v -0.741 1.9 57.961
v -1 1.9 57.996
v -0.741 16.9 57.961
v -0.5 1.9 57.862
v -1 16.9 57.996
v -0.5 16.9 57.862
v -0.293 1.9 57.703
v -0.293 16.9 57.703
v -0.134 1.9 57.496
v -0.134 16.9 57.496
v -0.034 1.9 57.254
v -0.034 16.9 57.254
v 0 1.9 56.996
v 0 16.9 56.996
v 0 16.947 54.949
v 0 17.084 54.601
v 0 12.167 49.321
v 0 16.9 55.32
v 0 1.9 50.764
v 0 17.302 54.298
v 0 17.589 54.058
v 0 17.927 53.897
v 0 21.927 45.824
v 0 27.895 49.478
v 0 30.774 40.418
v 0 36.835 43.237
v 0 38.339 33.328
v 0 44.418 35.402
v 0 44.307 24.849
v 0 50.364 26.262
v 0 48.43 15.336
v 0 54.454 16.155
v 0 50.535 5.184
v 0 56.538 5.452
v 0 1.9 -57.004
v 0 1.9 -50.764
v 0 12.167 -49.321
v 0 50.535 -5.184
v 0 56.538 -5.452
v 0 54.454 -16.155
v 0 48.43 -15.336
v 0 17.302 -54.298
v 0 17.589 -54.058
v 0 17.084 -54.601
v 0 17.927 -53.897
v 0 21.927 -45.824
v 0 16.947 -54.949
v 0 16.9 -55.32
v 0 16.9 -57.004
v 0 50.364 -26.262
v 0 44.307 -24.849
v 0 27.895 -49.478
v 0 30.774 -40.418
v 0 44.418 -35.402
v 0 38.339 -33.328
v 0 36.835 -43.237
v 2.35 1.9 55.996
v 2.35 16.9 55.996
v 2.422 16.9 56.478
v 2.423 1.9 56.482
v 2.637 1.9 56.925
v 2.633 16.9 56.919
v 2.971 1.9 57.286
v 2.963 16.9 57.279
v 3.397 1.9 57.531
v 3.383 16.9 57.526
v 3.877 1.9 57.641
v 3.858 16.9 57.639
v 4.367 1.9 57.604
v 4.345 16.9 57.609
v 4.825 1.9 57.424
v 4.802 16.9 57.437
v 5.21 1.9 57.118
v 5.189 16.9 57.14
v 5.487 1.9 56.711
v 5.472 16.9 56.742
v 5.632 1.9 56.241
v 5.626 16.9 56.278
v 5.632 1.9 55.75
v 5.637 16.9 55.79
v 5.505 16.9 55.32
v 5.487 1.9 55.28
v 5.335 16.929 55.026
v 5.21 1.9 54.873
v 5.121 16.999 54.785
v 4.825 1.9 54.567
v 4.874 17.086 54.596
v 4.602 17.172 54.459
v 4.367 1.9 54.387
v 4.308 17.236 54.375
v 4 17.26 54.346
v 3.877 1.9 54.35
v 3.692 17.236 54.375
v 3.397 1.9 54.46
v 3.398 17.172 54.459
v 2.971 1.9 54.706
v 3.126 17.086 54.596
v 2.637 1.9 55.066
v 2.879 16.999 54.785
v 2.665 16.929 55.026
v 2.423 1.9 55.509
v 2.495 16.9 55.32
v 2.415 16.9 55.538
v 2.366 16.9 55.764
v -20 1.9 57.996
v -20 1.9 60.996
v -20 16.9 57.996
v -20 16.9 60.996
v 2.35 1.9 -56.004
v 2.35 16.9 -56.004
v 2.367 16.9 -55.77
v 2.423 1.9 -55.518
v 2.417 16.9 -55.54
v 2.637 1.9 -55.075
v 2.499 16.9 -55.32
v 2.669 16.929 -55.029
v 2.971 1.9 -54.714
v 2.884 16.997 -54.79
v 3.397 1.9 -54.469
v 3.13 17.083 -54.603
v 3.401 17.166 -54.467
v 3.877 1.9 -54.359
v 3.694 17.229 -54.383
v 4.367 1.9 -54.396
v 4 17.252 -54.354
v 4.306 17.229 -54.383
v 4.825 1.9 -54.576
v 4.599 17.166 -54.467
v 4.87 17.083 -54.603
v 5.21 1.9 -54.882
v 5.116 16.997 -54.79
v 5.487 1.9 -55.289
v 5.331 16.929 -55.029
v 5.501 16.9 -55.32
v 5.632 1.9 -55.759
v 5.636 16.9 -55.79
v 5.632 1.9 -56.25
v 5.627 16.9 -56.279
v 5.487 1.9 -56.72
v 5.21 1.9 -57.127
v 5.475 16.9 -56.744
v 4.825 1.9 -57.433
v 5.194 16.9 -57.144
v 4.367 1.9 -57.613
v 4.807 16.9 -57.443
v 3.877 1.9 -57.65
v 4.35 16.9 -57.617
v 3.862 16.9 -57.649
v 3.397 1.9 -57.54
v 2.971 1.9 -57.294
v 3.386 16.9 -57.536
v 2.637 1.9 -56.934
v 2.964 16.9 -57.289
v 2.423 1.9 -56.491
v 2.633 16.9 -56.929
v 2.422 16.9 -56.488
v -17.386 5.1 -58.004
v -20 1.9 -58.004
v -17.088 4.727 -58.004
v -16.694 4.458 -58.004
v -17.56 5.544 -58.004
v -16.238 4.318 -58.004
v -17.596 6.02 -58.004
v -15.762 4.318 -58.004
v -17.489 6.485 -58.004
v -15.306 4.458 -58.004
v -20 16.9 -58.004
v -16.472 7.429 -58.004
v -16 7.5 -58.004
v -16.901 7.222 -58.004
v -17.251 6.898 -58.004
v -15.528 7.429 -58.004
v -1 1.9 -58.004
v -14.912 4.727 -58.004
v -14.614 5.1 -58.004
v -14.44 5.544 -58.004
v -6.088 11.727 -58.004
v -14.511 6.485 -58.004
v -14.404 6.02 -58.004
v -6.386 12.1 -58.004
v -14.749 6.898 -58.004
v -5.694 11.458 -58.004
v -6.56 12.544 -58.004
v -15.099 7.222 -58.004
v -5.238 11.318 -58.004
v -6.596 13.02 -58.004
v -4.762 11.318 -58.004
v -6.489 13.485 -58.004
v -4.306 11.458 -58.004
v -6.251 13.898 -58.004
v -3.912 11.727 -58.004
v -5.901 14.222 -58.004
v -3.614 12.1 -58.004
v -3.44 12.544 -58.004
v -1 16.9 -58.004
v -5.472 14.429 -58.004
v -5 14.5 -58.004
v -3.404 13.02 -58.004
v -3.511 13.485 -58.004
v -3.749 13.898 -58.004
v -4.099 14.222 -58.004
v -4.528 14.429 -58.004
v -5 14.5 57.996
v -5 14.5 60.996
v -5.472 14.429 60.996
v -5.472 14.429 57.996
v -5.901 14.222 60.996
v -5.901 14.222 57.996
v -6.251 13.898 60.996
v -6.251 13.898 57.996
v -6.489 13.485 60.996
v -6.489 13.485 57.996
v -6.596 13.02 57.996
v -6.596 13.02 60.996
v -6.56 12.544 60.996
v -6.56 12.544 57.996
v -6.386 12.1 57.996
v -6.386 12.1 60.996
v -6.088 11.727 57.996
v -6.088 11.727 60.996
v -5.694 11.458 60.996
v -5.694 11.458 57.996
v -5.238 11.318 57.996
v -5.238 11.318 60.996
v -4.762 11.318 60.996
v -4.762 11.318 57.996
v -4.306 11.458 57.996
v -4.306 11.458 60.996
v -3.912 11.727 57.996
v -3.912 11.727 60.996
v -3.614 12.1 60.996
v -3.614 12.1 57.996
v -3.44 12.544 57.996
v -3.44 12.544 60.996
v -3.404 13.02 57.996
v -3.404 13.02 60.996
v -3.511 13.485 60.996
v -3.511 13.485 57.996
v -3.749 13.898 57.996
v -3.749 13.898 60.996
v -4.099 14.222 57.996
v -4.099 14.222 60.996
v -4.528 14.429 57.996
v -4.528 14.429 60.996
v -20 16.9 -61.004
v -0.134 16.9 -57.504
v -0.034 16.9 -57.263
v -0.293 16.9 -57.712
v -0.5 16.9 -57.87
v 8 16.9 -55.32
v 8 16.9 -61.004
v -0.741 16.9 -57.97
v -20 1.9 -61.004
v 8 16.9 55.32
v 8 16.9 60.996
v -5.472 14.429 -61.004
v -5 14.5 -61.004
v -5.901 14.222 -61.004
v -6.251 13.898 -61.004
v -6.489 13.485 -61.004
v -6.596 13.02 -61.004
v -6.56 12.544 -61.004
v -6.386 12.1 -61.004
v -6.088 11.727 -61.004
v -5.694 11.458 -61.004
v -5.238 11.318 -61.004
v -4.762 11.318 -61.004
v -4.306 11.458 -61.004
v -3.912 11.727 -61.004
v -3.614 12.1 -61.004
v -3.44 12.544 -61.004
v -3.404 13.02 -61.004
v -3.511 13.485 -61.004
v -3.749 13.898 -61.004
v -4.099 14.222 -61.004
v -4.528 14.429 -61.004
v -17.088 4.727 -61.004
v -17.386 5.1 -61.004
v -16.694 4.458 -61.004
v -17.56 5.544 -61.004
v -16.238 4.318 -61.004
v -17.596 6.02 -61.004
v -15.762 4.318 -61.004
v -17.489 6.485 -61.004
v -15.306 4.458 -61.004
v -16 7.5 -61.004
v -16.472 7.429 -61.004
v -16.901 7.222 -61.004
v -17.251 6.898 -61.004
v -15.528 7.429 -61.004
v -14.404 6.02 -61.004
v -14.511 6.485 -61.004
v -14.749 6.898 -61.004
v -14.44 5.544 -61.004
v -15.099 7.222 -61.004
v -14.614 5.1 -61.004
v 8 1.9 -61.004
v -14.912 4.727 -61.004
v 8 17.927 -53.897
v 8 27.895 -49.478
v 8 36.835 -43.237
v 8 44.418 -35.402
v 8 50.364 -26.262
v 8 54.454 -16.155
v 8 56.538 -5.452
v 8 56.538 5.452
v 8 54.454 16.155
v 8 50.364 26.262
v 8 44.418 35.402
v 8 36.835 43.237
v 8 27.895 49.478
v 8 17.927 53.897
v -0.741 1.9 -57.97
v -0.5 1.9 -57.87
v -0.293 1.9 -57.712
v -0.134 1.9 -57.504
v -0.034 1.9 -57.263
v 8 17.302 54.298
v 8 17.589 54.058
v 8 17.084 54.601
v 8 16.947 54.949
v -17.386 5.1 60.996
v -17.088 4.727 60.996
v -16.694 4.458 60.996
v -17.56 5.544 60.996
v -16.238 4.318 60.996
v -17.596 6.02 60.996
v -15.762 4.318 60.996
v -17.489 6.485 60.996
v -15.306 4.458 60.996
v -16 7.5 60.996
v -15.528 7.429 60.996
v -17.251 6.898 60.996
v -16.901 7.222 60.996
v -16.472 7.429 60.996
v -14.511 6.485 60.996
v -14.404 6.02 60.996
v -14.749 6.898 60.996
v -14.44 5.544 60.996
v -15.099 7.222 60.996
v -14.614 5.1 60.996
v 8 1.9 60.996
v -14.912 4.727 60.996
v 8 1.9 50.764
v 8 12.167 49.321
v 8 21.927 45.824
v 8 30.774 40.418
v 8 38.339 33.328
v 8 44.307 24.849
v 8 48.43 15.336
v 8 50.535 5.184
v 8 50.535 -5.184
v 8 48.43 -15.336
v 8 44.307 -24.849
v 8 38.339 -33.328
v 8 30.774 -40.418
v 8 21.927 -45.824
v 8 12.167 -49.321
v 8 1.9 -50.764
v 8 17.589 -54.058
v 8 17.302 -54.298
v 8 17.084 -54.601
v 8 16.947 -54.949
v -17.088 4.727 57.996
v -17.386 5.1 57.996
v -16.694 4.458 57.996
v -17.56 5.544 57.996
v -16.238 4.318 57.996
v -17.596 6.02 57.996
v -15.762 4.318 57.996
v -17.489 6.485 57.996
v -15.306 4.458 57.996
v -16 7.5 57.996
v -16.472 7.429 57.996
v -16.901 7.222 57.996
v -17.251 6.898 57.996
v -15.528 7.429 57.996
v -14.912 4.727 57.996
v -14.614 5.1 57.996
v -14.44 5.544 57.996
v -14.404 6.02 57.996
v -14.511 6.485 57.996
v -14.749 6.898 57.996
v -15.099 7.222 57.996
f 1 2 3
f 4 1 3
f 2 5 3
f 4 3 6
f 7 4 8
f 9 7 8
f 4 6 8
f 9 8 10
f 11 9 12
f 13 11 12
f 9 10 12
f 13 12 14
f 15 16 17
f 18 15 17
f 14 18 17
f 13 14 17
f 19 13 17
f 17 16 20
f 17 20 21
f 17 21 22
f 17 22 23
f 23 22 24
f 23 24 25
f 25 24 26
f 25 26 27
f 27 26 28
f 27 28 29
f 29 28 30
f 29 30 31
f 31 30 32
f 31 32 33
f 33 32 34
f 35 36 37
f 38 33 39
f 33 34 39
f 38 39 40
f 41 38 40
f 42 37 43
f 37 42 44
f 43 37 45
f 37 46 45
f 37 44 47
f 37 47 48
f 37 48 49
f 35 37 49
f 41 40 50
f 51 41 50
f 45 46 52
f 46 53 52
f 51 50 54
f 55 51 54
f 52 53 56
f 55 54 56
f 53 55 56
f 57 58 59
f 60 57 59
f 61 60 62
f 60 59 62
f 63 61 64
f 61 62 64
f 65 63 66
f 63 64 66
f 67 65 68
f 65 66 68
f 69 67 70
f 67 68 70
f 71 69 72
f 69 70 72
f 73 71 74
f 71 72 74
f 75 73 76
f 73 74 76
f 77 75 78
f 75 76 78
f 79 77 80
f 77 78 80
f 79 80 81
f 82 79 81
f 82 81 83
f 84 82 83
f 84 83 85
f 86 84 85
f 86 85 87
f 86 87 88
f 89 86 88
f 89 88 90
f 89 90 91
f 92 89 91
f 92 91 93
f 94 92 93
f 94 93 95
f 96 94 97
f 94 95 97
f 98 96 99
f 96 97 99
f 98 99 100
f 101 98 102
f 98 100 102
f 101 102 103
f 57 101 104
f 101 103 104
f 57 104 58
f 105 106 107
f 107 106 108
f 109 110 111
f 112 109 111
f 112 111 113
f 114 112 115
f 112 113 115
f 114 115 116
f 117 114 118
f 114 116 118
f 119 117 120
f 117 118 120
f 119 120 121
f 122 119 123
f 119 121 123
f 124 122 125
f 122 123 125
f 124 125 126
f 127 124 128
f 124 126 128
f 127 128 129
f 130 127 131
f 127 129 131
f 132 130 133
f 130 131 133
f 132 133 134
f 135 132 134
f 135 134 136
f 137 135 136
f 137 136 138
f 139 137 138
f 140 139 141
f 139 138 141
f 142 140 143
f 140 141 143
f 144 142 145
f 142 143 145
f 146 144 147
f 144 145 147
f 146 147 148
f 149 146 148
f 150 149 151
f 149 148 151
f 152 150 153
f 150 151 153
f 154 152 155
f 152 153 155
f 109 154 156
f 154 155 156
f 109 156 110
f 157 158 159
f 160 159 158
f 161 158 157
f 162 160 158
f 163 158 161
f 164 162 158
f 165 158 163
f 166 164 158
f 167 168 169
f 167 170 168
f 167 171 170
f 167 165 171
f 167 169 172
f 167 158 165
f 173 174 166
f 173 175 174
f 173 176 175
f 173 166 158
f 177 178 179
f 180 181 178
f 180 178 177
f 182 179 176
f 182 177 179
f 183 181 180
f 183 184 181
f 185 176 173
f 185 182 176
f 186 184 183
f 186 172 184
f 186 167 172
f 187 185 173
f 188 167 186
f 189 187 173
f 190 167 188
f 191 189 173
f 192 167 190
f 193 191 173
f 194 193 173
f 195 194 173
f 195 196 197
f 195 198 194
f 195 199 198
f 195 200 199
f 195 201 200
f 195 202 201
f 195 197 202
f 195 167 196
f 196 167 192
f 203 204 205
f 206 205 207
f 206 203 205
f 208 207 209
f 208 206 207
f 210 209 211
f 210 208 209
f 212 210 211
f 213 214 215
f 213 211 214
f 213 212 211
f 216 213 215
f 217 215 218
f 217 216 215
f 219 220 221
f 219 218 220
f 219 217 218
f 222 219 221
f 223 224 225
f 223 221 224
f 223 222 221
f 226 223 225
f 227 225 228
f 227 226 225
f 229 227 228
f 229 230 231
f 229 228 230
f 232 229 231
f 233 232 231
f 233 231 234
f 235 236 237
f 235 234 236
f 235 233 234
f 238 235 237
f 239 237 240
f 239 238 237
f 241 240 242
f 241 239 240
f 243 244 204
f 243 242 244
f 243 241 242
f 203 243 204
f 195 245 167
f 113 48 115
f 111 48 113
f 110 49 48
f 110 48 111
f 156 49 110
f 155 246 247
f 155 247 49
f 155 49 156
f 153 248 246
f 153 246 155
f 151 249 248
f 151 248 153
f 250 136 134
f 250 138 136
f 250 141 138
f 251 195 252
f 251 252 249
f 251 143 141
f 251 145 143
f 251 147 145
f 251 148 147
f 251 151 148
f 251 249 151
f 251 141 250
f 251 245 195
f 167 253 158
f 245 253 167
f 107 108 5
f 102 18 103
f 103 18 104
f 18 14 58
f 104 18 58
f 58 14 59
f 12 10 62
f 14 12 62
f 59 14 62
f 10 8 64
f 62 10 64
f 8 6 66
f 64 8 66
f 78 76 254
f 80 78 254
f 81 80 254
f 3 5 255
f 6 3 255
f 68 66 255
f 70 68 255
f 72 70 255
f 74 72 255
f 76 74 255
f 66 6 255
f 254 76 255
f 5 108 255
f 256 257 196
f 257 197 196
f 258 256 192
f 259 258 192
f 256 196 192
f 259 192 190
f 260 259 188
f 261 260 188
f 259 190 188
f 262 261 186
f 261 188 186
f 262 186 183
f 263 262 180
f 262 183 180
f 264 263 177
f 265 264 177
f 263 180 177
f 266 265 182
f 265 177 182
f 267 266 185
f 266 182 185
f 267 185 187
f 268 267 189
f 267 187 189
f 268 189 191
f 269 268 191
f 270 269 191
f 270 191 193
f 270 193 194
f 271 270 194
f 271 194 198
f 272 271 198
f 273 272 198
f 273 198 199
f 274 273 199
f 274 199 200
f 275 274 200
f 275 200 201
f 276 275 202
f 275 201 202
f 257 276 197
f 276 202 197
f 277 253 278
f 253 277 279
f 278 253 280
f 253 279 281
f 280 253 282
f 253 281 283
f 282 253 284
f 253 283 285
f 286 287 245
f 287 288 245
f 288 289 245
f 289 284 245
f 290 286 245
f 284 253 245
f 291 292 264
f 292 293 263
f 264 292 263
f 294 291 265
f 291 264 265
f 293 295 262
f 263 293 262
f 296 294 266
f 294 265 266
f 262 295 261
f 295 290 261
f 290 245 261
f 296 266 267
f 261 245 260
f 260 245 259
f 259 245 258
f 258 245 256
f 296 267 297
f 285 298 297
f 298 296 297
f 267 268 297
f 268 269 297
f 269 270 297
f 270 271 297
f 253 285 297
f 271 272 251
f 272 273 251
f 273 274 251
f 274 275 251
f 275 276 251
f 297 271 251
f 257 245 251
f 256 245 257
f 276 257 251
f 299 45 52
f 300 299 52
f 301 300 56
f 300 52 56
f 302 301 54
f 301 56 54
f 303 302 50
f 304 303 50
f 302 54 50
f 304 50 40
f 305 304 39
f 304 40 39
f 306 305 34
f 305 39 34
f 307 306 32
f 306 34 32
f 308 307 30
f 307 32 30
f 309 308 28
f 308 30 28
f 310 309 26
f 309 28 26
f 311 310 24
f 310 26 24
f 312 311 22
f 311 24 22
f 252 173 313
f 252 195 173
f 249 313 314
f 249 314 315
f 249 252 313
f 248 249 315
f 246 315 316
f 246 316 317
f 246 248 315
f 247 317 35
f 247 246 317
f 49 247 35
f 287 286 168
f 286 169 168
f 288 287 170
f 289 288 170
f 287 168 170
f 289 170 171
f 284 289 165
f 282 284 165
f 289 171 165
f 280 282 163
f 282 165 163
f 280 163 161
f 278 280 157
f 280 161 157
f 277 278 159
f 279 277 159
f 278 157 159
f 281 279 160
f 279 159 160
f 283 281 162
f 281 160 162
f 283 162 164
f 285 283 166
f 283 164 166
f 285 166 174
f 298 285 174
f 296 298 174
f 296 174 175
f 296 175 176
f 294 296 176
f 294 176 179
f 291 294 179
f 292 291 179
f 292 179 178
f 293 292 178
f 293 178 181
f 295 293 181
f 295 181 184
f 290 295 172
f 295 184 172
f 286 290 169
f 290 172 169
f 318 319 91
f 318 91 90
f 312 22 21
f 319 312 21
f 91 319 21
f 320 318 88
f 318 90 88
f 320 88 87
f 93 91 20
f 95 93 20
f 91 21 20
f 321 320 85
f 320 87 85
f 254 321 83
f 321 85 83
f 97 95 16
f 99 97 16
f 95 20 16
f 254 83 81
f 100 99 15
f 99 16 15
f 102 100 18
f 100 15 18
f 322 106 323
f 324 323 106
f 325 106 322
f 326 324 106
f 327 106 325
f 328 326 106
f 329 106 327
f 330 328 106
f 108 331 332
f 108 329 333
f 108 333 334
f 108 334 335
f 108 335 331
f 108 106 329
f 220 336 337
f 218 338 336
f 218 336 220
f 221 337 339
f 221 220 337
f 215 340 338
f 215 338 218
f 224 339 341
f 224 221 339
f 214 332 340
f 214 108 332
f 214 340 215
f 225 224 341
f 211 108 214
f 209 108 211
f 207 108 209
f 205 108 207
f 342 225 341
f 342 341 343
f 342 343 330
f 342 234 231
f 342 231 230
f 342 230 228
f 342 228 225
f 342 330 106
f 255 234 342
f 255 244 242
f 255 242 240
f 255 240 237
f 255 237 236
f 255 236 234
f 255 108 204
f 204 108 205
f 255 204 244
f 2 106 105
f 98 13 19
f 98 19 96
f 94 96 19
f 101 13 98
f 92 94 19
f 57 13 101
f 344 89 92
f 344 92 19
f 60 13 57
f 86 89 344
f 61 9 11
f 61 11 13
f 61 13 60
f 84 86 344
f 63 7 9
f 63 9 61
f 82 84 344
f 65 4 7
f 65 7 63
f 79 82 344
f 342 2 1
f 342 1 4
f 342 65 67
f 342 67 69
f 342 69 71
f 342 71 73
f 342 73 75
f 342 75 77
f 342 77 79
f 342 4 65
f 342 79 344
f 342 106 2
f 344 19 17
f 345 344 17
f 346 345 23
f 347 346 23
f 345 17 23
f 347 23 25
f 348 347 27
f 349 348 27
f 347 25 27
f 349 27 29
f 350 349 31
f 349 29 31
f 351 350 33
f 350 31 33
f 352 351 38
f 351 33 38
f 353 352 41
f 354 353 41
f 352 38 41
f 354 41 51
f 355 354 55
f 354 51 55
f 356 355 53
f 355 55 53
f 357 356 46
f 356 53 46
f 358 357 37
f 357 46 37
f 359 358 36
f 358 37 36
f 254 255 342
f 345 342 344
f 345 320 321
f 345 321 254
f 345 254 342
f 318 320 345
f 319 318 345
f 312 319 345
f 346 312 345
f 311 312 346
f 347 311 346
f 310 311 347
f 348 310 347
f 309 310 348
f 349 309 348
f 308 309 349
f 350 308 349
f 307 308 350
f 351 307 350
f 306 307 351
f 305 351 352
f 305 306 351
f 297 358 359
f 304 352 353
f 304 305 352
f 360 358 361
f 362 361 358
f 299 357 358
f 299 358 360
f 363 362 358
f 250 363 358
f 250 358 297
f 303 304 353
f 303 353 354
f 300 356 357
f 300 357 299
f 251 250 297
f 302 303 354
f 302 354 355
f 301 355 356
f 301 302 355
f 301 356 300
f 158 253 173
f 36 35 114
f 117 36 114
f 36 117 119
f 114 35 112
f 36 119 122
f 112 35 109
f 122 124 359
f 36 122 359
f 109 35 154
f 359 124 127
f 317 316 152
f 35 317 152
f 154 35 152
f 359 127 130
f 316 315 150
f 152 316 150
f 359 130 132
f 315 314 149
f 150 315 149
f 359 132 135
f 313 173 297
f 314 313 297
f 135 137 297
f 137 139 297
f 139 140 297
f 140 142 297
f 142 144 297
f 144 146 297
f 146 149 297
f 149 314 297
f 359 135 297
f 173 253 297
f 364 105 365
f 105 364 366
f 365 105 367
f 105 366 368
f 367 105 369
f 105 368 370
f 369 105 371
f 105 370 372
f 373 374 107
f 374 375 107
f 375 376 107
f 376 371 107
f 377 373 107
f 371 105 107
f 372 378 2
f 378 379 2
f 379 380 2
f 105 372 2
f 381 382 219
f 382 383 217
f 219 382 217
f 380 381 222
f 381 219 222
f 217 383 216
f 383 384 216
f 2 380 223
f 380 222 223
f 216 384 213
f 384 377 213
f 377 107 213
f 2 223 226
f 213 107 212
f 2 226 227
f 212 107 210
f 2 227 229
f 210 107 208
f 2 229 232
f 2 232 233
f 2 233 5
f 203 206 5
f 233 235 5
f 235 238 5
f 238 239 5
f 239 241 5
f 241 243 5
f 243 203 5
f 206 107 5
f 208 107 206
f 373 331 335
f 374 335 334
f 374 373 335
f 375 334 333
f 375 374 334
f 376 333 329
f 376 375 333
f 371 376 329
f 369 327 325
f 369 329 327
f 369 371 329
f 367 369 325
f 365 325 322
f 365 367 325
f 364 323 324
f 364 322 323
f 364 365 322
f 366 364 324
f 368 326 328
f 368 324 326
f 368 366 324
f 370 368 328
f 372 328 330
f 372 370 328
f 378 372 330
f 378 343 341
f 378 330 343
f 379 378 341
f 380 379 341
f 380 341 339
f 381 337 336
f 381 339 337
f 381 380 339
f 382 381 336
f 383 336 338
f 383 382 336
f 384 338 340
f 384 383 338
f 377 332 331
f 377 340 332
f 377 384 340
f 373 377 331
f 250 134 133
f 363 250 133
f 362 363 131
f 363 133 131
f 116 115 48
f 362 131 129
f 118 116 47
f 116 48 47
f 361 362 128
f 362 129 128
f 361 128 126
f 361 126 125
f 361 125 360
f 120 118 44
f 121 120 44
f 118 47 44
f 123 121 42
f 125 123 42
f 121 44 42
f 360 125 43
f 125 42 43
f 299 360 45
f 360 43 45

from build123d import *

# Parameters (mm, degrees)
BOSS_EXTRUDE1_DEPTH           = 8
M4_TAPPED_HOLE1_D             = 3.3
SKETCH8_W                     = 20
SKETCH8_H                     = 15
BOSS_EXTRUDE2_DEPTH           = 3
FILLET1_R                     = 1
M3_CLEARANCE_HOLE1_AT_2_COUNT = 2
M3_CLEARANCE_HOLE1_AT_2_PITCH = 13.03840481
FILLET1_OF_MIRROR1_R          = 1


with BuildPart() as part:
    # Sketch1 → Boss-Extrude1 (new body)
    with BuildSketch(Plane(origin=(0, 0, 0), x_dir=(0, 0, -1), z_dir=(1, 0, 0))):
        with BuildLine():
            Line((-60.995543931, 1.9), (-50.764456069, 1.9))
            ThreePointArc((-50.764456069, 1.9), (0, 50.8), (50.764456069, 1.9))
            Line((50.764456069, 1.9), (61.004456069, 1.9))
            Line((61.004456069, 1.9), (61.004456069, 16.9))
            Line((61.004456069, 16.9), (55.320249457, 16.9))
            ThreePointArc((55.320249457, 16.9), (54.442787227, 17.18342282), (53.896915423, 17.926586621))
            ThreePointArc((53.896915423, 17.926586621), (0, 56.8), (-53.896915423, 17.926586621))
            ThreePointArc((-53.896915423, 17.926586621), (-54.442787227, 17.18342282), (-55.320249457, 16.9))
            Line((-55.320249457, 16.9), (-60.995543931, 16.9))
            Line((-60.995543931, 16.9), (-60.995543931, 1.9))
        make_face()
    extrude(amount=BOSS_EXTRUDE1_DEPTH)

    # M4 Tapped Hole1 (through all)
    with Locations(Plane.XZ.offset(-1.9)):
        with Locations((4, -56.004456069), (4, 55.995543931)):
            Hole(M4_TAPPED_HOLE1_D / 2)

    # Sketch8 → Boss-Extrude2 (add)
    with BuildSketch(Plane.XY.offset(60.995543931)):
        with Locations((-10, 9.4)):
            Rectangle(SKETCH8_W, SKETCH8_H)
    boss_extrude2 = extrude(amount=-BOSS_EXTRUDE2_DEPTH)

    # Fillet1
    fillet1_edges = [part.edges().sort_by_distance(p)[0] for p in [
        (0, 9.4, 57.995543931),
    ]]
    fillet(fillet1_edges, radius=FILLET1_R)

    # Sketch9 → M3 Clearance Hole1 (revolve, cut)
    with BuildSketch(Plane(origin=(-5, 12.9, 57.995543931), x_dir=(0, 1, 0), z_dir=(1, 0, 0))):
        Polygon((0, 0), (0, 15.96137699), (1.6, 15), (1.6, 0), align=None)
    m3_clearance_hole1 = revolve(axis=Axis((-5, 12.9, 51.645543931), (0, 0, 1)), mode=Mode.SUBTRACT)

    # M3 Clearance Hole1 at 2: M3 Clearance Hole1 ×2
    with Locations(*[Vector(-0.8436614877321075, -0.5368754921931593, 0) * (i * M3_CLEARANCE_HOLE1_AT_2_PITCH) for i in range(1, M3_CLEARANCE_HOLE1_AT_2_COUNT)]):
        add(m3_clearance_hole1, mode=Mode.SUBTRACT)

    # Mirror1: Boss-Extrude2, M3 Clearance Hole1 across plane
    add(boss_extrude2.mirror(Plane(origin=(0, 0, -0.004456069), x_dir=(1, 0, 0), z_dir=(0, 0, -1))))
    add(m3_clearance_hole1.mirror(Plane(origin=(0, 0, -0.004456069), x_dir=(1, 0, 0), z_dir=(0, 0, -1))), mode=Mode.SUBTRACT)

    # Mirror1 copy 1 sketch → Mirror1 copy 1 (revolve, cut)
    with BuildSketch(Plane(origin=(-16, 5.9, -58.004456069), x_dir=(0, 1, 0), z_dir=(1, 0, 0))):
        Polygon((0, 0), (0, -15.96137699), (1.6, -15), (1.6, 0), align=None)
    revolve(axis=Axis((-16, 5.9, -51.654456069), (0, 0, 1)), mode=Mode.SUBTRACT)

    # Fillet1 of Mirror1
    fillet1_of_mirror1_edges = [part.edges().sort_by_distance(p)[0] for p in [
        (0, 9.4, -58.004456069),
    ]]
    fillet(fillet1_of_mirror1_edges, radius=FILLET1_OF_MIRROR1_R)


solid = part.part
